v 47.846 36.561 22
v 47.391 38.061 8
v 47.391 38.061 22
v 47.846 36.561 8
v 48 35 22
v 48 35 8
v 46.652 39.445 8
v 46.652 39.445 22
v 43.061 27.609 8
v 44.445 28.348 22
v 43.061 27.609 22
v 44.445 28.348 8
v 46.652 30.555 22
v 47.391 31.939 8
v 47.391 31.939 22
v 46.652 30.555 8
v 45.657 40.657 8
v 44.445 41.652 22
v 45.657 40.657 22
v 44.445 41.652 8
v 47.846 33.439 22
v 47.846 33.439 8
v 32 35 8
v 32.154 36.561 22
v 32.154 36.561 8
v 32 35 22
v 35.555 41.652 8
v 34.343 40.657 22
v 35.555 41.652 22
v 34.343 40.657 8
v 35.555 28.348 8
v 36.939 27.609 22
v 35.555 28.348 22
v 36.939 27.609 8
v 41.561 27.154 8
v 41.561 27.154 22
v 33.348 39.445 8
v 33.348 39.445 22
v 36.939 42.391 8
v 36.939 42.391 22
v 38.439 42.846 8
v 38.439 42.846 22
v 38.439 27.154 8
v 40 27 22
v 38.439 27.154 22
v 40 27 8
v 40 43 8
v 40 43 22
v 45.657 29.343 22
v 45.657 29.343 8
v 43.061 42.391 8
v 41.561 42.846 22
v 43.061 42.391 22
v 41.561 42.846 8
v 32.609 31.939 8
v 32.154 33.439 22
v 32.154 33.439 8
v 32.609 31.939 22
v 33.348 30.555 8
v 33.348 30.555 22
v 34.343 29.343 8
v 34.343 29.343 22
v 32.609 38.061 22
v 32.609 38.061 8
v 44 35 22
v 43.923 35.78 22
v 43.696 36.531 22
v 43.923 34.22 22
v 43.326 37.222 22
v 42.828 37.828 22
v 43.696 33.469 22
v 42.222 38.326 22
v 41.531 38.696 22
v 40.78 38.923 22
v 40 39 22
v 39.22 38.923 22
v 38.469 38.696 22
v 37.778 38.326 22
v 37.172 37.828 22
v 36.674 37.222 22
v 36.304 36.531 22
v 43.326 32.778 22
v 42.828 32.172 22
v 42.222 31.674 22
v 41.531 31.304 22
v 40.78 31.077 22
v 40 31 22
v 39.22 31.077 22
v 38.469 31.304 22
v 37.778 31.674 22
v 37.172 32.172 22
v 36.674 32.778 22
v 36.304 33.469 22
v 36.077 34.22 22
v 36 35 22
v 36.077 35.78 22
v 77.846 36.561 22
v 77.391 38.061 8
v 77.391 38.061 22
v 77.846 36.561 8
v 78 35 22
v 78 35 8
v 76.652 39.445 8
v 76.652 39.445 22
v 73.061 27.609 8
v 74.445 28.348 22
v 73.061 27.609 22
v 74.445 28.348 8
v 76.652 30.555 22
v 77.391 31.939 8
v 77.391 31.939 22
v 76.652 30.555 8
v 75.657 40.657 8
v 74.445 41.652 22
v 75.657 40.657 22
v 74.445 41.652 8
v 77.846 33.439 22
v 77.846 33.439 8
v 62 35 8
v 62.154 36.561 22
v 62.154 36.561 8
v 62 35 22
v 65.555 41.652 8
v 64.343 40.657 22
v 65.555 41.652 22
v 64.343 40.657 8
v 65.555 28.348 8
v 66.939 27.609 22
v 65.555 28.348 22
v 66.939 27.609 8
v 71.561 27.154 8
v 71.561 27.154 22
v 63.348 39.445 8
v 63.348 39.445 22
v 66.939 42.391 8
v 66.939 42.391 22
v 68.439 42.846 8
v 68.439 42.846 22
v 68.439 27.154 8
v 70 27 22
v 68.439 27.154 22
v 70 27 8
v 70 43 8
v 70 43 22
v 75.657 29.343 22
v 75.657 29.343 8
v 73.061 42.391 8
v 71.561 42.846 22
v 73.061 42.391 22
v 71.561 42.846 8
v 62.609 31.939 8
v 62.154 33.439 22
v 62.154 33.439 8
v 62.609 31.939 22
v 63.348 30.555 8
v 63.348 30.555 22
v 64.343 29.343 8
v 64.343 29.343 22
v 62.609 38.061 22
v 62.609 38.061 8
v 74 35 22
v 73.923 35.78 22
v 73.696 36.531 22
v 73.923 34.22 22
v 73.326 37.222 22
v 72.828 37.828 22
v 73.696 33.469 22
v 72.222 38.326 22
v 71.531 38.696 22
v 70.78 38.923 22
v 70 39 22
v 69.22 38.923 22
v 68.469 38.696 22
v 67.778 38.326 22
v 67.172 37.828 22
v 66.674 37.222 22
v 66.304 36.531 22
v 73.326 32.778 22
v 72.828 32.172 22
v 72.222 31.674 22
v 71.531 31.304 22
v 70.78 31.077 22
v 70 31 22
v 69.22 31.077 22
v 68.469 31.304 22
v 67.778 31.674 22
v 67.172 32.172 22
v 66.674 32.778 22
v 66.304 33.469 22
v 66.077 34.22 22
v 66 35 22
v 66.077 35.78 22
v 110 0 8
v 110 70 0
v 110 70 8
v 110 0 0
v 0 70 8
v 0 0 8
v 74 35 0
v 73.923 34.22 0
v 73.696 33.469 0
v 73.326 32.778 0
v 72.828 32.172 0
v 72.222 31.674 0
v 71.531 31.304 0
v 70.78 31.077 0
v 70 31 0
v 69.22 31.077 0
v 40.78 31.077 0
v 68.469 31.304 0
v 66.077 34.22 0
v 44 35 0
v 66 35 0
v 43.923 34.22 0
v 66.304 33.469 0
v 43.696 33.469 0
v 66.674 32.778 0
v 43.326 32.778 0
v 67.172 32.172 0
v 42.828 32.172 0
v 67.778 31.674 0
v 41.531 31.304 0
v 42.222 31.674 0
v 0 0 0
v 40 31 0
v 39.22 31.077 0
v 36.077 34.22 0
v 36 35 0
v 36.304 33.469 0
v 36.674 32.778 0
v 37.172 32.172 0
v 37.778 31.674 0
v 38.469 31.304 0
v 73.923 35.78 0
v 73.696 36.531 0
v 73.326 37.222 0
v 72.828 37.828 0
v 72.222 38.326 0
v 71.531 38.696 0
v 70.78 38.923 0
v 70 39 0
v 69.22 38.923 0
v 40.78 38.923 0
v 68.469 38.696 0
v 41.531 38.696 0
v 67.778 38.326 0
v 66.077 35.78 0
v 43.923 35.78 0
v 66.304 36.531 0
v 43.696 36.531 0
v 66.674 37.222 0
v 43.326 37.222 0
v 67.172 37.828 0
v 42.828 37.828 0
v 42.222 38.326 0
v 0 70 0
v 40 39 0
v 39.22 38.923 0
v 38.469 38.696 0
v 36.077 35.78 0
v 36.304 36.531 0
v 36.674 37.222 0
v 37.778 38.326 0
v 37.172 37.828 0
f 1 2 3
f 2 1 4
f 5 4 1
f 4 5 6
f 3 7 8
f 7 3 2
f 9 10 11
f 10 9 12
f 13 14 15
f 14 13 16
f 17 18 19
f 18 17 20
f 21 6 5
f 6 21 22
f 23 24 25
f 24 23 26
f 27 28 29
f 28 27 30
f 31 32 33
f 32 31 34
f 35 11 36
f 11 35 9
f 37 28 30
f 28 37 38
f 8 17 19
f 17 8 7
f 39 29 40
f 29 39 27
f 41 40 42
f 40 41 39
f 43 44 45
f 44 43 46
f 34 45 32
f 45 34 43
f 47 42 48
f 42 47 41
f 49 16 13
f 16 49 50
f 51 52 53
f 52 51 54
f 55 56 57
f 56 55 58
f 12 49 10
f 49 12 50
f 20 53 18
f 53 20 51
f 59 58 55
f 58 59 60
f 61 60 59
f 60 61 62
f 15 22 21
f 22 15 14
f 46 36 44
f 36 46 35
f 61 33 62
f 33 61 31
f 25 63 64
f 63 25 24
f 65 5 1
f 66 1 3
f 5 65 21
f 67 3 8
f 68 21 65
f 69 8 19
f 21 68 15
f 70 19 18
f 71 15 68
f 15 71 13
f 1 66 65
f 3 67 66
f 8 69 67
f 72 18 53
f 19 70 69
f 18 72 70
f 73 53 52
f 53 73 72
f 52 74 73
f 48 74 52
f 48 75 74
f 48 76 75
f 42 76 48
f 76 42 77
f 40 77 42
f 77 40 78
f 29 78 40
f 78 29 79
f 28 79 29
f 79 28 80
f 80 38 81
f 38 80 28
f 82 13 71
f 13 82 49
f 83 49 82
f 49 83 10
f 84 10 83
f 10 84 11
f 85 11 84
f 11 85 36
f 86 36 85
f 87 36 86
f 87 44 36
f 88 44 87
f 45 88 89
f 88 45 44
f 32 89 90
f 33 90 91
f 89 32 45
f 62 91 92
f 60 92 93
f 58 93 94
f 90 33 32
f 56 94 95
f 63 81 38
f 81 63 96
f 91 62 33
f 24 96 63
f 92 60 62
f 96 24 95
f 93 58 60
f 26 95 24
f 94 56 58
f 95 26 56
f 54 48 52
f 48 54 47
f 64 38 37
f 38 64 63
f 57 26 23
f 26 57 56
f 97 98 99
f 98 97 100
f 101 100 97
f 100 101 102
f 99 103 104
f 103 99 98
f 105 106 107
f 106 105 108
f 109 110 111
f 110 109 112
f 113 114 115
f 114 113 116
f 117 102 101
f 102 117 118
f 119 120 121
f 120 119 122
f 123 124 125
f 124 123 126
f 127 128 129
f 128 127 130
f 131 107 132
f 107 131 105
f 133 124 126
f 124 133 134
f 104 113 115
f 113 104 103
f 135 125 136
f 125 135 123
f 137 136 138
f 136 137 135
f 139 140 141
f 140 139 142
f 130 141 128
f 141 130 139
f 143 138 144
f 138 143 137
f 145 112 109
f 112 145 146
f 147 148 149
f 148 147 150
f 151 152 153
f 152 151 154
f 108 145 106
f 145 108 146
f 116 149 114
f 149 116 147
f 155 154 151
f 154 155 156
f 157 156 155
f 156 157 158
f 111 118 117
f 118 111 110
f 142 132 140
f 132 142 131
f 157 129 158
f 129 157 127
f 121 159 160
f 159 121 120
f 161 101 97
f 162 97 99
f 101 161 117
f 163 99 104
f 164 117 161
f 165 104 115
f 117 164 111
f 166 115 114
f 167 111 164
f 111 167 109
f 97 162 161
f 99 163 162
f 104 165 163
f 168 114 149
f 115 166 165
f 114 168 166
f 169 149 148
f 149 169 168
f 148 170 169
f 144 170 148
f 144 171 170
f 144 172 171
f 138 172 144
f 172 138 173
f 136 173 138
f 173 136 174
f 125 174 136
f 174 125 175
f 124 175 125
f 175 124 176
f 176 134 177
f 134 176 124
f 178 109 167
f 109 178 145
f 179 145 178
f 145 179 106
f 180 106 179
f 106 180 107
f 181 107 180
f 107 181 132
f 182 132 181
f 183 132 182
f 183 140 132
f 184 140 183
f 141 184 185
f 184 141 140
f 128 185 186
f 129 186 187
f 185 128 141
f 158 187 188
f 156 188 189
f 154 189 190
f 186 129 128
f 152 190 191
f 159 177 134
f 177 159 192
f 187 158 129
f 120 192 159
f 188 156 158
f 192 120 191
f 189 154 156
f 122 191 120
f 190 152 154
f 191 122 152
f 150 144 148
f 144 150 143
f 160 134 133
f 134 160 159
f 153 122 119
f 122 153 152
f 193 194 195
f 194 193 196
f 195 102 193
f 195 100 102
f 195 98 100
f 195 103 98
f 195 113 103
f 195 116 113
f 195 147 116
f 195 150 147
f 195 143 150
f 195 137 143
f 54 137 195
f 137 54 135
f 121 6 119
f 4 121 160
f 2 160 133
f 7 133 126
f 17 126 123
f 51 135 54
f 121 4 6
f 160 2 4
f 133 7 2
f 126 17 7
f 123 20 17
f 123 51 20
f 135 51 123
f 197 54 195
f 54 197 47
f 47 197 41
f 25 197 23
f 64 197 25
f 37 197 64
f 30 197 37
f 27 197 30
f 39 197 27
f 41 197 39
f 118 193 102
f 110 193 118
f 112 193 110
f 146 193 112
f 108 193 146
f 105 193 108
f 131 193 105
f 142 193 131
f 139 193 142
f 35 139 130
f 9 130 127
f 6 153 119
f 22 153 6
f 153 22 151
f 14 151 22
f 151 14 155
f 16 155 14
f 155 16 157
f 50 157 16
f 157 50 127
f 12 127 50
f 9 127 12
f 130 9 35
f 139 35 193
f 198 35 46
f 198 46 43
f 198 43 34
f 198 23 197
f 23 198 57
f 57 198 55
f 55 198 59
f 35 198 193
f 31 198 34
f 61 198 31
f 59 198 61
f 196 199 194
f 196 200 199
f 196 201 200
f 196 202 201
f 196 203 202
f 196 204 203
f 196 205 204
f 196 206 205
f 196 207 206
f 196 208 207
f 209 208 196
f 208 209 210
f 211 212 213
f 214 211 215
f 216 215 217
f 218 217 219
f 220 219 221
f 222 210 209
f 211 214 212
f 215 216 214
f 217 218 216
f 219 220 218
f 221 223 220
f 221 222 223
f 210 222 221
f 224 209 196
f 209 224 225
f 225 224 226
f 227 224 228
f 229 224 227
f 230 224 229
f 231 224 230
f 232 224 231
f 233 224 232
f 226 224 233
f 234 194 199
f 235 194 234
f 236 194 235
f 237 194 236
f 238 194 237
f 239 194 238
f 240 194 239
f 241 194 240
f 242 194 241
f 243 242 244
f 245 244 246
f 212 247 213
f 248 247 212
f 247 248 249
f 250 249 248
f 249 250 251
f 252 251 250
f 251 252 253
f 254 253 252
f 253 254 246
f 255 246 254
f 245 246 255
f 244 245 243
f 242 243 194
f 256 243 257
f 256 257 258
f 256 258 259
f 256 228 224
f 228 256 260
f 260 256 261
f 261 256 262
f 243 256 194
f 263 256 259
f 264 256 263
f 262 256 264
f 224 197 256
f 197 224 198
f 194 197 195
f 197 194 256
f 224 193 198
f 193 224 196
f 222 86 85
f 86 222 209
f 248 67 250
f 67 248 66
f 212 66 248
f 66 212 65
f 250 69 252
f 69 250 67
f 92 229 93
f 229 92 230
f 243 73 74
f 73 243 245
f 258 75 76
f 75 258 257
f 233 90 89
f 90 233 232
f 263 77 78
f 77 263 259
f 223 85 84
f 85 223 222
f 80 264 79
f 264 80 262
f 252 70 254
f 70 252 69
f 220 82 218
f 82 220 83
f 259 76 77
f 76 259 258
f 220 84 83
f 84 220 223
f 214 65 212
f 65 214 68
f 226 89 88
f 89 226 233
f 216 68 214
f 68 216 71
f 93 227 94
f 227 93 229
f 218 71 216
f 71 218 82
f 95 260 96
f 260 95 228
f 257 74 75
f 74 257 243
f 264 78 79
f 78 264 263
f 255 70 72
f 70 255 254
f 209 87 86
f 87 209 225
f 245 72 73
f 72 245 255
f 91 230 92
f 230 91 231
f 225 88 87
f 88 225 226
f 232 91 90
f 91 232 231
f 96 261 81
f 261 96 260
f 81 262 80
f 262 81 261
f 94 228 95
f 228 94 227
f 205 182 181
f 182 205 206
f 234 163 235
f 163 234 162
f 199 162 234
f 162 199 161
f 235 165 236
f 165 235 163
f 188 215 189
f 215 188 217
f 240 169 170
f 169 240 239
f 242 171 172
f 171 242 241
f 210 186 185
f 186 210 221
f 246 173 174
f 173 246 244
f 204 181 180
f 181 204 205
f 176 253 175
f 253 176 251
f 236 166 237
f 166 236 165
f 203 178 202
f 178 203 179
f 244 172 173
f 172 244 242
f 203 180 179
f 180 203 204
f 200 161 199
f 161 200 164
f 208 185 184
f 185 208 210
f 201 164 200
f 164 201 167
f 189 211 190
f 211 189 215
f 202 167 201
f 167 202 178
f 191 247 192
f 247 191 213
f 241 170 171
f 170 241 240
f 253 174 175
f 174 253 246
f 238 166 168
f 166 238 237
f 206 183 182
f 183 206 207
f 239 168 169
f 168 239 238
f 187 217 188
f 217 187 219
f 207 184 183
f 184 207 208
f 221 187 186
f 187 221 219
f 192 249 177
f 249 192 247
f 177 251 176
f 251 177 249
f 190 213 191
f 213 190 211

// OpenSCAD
$fn = 32;

// ----------------------------------------------------------------------
// Drill jig: two_boss jig
// ----------------------------------------------------------------------

// --- parameters (mm) ---
plate_l = 110;            // plate length, X
plate_w = 70;             // plate width, Y
plate_t = 8;              // plate thickness
boss_d = 16;              // guide boss diameter
boss_h = 15;              // boss height above the plate
guide_d = 8;              // guide hole diameter
boss_pitch = 30;          // boss pitch

n_boss = 2;  // guide bosses
boss_x0 = (plate_l - (n_boss - 1) * boss_pitch) / 2;  // first boss X
boss_top = plate_t - 1 + boss_h;  // boss crown height
total_h = boss_top;  // overall height

difference() {
  union() {
  cube([plate_l, plate_w, plate_t]);
  for (i = [0 : n_boss - 1])
    translate([boss_x0 + i * boss_pitch, plate_w / 2, plate_t - 1])
      cylinder(h = boss_h, d = boss_d);
  }
  for (i = [0 : n_boss - 1])
    translate([boss_x0 + i * boss_pitch, plate_w / 2, -1])
      cylinder(h = plate_t + boss_h, d = guide_d);
}
